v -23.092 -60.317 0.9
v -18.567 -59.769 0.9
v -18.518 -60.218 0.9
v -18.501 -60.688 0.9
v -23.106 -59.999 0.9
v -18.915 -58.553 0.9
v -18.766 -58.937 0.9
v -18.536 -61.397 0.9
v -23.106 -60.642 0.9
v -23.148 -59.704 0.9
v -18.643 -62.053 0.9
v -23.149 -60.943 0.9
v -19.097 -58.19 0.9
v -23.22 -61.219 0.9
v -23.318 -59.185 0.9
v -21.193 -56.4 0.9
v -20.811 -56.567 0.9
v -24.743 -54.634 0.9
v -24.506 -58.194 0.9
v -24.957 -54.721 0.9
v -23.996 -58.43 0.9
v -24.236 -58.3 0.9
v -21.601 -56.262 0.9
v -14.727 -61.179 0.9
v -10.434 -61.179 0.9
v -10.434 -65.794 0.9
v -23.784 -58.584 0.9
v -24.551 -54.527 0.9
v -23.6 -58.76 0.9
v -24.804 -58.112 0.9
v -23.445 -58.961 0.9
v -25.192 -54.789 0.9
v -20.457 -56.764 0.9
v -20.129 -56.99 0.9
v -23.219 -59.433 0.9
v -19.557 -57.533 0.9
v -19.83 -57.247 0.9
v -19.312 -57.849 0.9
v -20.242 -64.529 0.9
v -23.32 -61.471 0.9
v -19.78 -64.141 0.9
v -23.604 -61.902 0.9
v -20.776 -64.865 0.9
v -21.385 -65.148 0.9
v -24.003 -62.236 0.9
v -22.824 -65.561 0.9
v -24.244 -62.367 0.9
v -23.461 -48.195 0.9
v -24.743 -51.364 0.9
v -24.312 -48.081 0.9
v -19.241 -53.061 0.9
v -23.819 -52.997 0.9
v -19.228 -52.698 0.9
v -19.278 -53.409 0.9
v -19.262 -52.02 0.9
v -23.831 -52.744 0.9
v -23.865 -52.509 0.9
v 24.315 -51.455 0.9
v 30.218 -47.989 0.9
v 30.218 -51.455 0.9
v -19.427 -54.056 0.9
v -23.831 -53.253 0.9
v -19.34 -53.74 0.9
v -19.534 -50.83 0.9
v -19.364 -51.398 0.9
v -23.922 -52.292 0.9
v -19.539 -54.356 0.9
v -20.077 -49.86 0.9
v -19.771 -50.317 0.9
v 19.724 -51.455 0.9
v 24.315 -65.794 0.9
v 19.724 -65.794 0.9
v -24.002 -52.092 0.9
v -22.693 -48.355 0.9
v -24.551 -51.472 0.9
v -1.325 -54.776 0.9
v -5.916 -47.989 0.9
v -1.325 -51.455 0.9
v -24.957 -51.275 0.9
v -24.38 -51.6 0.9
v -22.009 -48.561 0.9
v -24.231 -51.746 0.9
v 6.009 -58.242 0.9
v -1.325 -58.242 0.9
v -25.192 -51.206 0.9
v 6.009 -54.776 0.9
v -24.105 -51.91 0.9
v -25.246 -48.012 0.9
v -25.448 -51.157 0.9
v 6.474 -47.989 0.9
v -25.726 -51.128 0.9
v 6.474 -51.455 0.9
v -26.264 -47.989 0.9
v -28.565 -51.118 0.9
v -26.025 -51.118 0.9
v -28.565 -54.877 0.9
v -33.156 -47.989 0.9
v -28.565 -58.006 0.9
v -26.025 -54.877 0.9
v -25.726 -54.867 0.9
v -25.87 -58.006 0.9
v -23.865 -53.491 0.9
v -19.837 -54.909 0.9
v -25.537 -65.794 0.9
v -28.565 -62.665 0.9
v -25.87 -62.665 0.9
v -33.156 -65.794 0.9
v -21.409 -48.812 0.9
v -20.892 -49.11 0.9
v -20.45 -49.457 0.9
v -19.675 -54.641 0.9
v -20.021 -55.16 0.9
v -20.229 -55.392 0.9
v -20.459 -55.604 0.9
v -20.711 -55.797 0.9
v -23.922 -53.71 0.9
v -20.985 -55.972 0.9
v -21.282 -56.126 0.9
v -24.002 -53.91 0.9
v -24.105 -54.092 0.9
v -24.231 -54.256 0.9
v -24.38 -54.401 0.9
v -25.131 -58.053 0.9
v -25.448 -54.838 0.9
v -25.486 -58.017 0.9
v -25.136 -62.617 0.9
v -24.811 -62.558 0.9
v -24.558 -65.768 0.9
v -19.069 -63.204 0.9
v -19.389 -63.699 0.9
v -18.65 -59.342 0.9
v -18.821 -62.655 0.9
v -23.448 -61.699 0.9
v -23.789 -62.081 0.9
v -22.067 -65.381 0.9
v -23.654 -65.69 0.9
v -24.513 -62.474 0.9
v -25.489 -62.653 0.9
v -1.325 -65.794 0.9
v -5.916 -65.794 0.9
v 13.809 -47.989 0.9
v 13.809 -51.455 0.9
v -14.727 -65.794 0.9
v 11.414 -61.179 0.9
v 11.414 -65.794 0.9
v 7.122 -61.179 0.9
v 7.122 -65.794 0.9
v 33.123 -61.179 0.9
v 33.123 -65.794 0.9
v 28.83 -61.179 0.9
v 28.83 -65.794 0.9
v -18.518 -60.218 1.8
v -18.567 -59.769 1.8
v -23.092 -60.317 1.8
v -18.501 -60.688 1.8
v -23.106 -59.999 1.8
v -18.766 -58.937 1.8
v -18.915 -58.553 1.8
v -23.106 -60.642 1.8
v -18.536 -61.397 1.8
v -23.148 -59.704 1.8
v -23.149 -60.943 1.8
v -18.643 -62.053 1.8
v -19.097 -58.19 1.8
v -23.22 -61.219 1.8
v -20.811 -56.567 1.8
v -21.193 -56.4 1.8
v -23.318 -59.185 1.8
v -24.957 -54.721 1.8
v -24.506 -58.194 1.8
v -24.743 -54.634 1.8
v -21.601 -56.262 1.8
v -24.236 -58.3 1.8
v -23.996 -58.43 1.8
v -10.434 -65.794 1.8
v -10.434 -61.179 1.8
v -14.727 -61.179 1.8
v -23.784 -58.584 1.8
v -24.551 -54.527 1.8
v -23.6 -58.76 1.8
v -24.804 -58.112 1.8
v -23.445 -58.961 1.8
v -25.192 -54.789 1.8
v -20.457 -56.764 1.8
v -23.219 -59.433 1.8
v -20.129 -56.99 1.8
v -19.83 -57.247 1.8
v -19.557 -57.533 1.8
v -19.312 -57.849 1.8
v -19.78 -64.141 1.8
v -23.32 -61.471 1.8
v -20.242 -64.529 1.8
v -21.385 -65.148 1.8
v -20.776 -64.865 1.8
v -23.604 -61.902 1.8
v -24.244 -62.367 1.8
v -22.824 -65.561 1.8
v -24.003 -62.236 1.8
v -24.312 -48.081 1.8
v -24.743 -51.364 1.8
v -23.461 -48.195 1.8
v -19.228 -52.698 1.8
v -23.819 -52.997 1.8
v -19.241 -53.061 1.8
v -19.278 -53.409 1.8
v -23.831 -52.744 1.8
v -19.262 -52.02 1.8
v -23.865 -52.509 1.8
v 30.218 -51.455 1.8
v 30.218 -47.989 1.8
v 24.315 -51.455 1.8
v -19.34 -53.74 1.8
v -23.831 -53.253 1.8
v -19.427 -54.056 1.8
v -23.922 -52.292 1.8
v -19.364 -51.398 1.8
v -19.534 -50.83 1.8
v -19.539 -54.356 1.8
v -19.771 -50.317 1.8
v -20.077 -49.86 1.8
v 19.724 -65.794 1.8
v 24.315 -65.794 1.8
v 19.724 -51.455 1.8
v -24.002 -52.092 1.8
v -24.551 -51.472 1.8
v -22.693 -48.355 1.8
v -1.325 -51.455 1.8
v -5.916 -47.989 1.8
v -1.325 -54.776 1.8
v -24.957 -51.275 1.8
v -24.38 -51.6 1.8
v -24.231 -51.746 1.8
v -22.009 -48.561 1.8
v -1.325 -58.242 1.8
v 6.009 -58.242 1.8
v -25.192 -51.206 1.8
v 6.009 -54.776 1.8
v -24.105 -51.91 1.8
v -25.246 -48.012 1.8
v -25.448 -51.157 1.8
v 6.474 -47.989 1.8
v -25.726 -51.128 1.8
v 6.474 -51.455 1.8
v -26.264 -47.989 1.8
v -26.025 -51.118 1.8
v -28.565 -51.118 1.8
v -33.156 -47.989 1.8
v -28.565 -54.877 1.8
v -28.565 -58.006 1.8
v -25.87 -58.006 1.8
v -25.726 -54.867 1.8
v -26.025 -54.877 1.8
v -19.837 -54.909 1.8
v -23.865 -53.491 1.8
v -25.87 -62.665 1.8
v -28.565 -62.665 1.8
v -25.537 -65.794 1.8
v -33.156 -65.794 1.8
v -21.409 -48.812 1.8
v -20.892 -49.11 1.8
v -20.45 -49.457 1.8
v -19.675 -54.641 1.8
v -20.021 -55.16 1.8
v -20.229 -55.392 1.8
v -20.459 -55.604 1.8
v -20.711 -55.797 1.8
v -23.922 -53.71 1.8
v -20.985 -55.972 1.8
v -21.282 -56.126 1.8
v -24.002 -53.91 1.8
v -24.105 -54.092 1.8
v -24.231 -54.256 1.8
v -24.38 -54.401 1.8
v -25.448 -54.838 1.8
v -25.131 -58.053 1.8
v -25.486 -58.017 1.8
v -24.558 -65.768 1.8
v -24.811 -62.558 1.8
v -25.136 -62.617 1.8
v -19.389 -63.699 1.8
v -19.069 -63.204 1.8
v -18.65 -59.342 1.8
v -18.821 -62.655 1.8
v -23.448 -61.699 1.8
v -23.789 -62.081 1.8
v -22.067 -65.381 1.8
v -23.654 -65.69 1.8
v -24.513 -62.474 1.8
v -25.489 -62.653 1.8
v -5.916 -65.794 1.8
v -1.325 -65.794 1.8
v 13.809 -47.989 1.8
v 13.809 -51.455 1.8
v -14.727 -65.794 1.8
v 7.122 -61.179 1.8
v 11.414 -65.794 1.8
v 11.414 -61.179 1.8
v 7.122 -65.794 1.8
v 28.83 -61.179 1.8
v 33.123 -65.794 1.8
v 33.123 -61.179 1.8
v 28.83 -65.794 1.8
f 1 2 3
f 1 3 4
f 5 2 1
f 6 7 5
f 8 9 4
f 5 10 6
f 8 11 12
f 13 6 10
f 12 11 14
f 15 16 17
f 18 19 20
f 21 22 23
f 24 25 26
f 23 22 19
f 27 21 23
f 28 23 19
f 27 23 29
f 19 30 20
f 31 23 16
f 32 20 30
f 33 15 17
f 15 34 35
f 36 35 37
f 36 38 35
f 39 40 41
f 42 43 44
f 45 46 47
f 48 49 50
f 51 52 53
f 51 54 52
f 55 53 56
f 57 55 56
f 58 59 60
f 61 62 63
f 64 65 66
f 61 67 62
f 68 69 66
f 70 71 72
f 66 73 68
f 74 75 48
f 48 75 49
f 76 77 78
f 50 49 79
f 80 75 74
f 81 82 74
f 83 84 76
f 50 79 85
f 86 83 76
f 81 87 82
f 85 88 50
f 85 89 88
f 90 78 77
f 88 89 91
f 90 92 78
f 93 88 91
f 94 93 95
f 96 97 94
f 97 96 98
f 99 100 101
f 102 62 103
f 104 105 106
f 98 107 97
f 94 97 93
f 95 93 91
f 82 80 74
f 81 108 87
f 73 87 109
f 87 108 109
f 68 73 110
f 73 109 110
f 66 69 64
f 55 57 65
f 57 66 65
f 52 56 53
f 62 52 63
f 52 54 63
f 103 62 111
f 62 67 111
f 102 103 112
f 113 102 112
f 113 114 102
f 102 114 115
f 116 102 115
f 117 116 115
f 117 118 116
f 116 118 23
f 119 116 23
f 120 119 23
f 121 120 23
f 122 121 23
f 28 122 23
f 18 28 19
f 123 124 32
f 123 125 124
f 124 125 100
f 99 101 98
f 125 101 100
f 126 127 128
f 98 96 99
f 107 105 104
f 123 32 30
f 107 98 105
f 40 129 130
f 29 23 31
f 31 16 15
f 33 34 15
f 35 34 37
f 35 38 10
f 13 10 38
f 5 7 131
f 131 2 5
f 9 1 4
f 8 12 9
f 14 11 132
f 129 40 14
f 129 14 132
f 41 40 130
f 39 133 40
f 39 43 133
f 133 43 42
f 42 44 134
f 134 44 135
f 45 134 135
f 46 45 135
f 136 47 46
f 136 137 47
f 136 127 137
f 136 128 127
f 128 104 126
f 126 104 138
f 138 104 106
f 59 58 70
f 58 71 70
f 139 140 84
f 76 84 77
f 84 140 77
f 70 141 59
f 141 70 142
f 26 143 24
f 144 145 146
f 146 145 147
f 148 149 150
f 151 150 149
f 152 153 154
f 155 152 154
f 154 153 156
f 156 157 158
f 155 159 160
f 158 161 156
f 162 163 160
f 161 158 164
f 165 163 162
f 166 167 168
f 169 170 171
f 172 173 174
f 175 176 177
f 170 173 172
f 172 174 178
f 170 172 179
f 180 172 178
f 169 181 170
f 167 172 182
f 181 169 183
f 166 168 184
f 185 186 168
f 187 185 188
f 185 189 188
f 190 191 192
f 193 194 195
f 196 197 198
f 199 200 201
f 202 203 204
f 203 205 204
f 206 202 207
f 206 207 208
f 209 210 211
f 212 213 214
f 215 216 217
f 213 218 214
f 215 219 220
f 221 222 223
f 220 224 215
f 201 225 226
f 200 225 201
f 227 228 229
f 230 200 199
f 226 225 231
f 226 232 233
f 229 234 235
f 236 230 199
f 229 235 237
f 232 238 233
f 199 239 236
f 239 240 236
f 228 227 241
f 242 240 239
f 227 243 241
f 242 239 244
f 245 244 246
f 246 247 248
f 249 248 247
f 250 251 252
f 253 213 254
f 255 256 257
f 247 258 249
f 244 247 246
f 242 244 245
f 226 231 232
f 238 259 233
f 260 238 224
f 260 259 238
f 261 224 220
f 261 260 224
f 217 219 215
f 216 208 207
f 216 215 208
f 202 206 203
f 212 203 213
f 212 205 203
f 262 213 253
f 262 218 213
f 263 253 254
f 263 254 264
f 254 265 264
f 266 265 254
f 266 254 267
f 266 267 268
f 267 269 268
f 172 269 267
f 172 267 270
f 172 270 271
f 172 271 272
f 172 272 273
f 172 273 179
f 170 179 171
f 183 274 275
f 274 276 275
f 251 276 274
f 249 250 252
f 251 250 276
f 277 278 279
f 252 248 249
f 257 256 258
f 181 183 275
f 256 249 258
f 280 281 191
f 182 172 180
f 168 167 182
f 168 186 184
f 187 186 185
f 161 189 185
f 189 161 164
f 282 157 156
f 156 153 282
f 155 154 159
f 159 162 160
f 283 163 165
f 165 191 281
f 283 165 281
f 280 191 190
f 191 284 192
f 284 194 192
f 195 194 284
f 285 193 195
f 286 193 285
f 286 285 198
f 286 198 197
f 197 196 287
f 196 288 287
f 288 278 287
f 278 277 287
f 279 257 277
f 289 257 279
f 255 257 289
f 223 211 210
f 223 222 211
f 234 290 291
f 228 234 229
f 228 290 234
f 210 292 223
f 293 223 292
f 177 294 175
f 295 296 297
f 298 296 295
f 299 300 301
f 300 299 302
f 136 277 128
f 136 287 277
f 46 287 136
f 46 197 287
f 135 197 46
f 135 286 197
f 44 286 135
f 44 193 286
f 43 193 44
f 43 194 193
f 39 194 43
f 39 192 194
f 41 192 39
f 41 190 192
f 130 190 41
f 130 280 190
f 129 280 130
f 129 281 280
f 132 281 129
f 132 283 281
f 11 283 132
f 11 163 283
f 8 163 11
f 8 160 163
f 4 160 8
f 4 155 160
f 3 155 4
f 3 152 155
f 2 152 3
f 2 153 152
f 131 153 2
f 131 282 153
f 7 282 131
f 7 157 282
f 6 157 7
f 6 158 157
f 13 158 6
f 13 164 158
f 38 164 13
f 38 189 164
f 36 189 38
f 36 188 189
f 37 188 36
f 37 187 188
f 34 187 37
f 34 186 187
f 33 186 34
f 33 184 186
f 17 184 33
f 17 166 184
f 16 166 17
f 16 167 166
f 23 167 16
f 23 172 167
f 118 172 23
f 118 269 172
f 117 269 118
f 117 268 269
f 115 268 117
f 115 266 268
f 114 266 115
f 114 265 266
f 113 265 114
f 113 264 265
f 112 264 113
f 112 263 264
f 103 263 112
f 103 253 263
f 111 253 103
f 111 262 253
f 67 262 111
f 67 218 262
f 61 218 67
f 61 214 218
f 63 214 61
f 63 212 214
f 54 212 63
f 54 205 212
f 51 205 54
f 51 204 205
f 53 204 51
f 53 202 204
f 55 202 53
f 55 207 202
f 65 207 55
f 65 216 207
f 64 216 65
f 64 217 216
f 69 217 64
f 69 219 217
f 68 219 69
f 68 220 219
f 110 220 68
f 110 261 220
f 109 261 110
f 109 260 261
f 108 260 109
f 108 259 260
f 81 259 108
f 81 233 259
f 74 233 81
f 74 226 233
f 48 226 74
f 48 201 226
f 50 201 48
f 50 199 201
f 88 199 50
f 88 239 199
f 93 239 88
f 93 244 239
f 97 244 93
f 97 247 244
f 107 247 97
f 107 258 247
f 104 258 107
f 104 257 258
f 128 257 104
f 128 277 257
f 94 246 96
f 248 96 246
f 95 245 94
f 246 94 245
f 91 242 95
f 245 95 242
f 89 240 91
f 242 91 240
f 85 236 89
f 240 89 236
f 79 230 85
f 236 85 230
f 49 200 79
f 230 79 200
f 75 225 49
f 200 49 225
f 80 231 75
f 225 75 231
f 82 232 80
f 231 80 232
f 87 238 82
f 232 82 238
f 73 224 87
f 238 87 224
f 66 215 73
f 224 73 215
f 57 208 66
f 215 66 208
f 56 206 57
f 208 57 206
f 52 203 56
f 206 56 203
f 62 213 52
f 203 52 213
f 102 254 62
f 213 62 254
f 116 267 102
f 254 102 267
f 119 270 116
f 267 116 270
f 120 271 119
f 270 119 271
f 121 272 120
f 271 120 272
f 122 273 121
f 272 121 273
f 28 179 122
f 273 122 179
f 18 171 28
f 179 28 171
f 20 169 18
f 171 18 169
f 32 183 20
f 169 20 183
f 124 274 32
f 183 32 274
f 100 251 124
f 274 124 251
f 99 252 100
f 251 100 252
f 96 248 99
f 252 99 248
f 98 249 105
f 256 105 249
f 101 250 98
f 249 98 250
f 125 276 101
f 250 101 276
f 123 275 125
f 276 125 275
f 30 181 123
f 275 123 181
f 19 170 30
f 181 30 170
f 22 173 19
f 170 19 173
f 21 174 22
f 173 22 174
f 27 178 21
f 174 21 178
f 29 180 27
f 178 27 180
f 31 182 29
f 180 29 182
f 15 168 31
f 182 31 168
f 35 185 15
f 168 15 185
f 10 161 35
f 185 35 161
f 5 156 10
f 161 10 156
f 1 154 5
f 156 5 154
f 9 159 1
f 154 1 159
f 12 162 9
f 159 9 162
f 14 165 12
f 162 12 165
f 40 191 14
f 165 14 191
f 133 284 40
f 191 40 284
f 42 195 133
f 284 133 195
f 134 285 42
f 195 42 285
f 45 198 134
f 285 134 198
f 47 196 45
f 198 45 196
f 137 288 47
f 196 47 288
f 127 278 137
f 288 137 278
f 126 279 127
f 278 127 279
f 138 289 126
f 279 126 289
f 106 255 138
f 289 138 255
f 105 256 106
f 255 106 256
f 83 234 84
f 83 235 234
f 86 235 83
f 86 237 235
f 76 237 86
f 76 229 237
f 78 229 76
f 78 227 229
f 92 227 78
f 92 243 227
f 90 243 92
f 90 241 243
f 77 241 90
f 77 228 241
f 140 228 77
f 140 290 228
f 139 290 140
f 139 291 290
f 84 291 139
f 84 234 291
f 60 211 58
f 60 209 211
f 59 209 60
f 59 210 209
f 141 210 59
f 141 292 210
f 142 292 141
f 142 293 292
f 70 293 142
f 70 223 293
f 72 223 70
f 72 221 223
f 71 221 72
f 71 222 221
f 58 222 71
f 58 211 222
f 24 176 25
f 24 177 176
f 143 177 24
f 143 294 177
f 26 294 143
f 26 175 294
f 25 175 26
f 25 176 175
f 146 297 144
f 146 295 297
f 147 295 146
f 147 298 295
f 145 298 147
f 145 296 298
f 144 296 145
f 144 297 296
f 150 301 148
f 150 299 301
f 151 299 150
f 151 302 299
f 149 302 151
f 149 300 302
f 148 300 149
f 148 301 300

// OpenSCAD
$fn = 48;
  // English (below bottom hole)
  translate([0, -57.100, 0.900]) linear_extrude(height=0.900) text("B.F.T.", size=17.585, halign="center", valign="center", font="Helvetica Neue:style=Bold");
